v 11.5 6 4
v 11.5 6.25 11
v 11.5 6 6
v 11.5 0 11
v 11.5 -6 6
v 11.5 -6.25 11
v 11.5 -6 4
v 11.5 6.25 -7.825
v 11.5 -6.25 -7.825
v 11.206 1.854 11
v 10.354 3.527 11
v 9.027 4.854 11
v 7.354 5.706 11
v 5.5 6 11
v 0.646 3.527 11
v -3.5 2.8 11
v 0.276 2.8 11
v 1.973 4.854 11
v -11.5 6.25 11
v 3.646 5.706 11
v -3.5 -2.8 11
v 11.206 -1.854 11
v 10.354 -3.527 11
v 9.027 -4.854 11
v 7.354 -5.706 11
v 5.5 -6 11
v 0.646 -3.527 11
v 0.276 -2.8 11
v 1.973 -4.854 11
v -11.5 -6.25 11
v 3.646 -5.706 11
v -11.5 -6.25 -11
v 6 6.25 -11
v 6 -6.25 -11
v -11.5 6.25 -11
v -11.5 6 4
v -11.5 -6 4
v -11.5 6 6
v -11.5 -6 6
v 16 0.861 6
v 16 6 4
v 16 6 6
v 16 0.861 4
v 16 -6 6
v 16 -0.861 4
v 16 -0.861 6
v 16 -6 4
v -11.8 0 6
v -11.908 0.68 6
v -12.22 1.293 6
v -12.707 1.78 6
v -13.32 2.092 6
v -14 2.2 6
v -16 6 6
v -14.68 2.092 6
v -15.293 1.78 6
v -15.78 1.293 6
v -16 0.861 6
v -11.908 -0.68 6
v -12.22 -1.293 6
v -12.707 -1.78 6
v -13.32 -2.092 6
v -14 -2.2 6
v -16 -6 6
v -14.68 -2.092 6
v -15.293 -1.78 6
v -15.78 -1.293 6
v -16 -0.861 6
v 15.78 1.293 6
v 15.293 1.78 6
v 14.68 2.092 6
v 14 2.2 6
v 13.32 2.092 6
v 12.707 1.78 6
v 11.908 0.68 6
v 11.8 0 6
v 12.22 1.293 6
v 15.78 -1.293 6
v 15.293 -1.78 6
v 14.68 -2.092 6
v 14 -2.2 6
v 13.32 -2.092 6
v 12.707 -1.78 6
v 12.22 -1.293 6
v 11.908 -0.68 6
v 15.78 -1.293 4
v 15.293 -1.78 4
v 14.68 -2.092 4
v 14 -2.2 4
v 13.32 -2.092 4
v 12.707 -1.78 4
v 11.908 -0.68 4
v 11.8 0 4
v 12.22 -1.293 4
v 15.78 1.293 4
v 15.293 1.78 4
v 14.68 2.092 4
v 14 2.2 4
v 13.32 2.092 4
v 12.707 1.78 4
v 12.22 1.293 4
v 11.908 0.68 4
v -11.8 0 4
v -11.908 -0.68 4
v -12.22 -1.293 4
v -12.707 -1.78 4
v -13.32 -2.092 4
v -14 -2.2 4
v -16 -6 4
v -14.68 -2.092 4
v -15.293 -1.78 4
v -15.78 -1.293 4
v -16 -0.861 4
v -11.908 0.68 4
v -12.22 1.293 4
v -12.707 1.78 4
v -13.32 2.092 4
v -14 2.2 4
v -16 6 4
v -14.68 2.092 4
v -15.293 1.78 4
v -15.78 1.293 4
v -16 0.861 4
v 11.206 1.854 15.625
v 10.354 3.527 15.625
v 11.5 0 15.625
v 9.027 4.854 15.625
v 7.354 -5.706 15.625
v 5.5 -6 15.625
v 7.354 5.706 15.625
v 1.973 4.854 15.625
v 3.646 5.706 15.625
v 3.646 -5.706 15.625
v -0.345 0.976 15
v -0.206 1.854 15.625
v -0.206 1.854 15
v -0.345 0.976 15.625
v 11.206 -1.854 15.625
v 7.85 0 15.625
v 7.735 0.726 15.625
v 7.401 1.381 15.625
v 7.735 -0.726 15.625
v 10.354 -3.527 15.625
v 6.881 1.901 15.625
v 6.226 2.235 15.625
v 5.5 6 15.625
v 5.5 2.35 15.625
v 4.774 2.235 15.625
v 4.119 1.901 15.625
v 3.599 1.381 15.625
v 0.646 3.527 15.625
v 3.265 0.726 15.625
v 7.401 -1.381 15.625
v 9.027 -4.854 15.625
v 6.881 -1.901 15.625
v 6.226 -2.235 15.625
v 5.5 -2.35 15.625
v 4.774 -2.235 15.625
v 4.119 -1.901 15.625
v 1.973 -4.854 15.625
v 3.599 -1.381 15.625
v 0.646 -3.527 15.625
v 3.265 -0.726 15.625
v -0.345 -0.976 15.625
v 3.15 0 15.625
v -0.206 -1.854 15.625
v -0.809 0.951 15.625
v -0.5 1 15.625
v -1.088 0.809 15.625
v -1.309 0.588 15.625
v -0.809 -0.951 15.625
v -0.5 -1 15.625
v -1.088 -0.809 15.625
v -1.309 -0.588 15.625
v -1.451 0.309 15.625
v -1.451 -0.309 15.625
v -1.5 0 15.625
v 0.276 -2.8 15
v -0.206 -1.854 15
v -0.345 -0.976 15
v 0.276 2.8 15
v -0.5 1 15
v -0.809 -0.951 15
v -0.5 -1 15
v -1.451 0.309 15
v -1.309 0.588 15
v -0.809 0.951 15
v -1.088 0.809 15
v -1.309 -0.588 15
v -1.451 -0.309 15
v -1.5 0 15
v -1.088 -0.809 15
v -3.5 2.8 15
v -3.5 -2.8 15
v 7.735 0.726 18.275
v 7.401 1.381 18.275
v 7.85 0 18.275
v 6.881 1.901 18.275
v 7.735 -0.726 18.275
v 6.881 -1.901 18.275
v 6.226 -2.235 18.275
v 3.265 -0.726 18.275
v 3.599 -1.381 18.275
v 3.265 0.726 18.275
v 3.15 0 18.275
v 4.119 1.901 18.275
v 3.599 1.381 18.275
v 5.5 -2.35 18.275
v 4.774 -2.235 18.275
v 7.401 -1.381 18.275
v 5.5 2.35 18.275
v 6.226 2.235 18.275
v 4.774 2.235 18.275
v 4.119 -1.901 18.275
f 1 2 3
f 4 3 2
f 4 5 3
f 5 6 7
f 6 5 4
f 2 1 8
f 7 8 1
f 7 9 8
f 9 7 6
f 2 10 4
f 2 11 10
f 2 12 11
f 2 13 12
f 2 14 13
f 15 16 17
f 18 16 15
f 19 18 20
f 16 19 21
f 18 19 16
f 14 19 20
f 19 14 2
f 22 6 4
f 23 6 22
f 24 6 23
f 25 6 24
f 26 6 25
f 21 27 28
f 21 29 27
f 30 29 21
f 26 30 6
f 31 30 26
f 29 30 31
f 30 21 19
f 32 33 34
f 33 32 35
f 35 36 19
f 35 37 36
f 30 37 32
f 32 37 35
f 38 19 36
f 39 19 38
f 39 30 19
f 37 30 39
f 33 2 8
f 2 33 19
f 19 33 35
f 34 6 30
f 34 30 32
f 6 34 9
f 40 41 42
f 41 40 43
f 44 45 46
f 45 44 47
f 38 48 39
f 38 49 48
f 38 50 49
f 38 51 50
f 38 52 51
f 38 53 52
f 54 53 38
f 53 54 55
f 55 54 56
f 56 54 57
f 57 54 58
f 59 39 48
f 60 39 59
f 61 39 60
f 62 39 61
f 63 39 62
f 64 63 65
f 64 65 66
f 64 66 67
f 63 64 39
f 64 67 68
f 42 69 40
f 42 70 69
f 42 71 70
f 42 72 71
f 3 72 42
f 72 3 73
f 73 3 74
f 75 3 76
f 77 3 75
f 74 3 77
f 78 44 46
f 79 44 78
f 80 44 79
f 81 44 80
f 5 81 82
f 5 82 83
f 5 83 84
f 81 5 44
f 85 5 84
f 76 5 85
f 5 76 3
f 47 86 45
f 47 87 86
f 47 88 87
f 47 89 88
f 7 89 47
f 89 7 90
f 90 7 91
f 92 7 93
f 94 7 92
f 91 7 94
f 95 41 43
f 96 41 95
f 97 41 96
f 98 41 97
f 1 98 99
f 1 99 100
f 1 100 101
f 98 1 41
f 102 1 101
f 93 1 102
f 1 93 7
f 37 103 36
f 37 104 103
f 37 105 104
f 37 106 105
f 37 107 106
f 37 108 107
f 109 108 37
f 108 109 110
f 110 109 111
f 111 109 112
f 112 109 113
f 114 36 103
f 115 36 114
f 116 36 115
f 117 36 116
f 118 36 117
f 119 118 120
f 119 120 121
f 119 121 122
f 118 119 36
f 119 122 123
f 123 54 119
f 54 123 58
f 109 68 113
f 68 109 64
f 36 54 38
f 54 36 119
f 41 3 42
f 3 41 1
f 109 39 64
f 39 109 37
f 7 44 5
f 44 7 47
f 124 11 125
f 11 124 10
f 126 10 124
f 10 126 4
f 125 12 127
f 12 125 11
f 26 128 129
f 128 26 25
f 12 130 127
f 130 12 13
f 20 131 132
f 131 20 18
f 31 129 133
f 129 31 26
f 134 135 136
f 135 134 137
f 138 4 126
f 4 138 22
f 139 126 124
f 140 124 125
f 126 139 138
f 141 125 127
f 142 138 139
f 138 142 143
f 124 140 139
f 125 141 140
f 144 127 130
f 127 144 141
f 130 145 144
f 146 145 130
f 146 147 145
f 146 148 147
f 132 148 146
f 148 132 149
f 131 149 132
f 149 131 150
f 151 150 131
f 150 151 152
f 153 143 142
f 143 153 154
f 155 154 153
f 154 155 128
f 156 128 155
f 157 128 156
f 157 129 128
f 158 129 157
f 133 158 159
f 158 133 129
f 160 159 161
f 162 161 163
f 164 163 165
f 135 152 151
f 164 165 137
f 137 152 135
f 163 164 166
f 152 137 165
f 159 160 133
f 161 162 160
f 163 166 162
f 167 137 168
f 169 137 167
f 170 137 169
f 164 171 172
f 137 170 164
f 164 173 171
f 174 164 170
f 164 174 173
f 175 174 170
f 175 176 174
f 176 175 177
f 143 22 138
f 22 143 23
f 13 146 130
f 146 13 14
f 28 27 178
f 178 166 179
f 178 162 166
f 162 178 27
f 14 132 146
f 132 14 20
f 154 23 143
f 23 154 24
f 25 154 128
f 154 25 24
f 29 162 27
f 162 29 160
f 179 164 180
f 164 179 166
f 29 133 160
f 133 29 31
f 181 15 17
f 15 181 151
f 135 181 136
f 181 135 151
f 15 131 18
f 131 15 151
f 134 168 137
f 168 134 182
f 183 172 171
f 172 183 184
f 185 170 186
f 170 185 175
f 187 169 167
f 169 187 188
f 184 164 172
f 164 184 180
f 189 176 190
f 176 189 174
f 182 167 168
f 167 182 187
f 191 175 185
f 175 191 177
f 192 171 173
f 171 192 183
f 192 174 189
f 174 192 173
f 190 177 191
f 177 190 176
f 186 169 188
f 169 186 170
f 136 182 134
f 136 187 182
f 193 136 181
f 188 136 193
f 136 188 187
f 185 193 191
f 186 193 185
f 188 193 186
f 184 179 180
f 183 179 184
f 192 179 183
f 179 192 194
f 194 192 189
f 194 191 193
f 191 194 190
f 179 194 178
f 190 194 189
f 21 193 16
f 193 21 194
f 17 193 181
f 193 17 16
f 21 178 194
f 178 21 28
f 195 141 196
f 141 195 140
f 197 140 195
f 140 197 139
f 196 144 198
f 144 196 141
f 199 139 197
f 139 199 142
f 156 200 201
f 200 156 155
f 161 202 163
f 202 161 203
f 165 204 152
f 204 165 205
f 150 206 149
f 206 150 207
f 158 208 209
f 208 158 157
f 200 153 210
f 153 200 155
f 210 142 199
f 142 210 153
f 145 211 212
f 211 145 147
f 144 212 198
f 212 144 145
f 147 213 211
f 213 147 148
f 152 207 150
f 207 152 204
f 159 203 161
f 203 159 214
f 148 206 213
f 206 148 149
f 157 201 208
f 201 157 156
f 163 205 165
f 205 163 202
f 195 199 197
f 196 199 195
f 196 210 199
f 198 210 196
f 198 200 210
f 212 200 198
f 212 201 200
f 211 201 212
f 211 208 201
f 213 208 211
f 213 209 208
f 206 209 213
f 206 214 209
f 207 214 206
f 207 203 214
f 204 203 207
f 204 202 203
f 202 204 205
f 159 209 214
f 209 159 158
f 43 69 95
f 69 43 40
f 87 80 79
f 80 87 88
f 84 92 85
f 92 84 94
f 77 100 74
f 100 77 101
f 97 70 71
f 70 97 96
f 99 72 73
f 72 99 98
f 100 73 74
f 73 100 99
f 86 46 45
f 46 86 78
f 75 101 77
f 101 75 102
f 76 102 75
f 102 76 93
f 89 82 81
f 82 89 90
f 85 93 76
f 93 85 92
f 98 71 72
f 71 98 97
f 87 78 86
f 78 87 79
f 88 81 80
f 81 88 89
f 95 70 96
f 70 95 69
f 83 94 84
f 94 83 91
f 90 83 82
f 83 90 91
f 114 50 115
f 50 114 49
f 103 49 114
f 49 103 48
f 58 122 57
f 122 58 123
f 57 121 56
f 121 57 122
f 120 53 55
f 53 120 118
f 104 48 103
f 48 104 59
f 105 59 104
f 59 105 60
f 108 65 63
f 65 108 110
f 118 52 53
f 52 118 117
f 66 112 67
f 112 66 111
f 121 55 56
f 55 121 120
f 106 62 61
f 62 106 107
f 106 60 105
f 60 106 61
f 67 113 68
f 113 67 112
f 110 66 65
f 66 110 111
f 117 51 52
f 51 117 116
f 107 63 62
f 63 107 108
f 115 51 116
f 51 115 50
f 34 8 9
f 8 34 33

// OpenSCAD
// Source: https://www.thingiverse.com/thing:29734
// License: CC-BY

module MicroServo(){
	difference(){			
		union(){
			color("black") cube([23,12.5,22], center=true);
			color("black") translate([0,0,5]) cube([32,12,2], center=true);
			color("black") translate([5.5,0,2.75]) cylinder(r=6, h=25.75, $fn=20, center=true);
			color("black") translate([-.5,0,2.75]) cylinder(r=1, h=25.75, $fn=20, center=true);
			color("black") translate([-1,0,2.75]) cube([5,5.6,24.5], center=true);		
			color("silver") translate([5.5,0,3.65]) cylinder(r=2.35, h=29.25, $fn=20, center=true);				
		}
		translate([10,0,-11]) rotate([0,-30,0]) cube([8,13,4], center=true);
		for ( hole = [14,-14] ){
			translate([hole,0,5]) cylinder(r=2.2, h=4, $fn=20, center=true);
		}	
	}
}

MicroServo();
